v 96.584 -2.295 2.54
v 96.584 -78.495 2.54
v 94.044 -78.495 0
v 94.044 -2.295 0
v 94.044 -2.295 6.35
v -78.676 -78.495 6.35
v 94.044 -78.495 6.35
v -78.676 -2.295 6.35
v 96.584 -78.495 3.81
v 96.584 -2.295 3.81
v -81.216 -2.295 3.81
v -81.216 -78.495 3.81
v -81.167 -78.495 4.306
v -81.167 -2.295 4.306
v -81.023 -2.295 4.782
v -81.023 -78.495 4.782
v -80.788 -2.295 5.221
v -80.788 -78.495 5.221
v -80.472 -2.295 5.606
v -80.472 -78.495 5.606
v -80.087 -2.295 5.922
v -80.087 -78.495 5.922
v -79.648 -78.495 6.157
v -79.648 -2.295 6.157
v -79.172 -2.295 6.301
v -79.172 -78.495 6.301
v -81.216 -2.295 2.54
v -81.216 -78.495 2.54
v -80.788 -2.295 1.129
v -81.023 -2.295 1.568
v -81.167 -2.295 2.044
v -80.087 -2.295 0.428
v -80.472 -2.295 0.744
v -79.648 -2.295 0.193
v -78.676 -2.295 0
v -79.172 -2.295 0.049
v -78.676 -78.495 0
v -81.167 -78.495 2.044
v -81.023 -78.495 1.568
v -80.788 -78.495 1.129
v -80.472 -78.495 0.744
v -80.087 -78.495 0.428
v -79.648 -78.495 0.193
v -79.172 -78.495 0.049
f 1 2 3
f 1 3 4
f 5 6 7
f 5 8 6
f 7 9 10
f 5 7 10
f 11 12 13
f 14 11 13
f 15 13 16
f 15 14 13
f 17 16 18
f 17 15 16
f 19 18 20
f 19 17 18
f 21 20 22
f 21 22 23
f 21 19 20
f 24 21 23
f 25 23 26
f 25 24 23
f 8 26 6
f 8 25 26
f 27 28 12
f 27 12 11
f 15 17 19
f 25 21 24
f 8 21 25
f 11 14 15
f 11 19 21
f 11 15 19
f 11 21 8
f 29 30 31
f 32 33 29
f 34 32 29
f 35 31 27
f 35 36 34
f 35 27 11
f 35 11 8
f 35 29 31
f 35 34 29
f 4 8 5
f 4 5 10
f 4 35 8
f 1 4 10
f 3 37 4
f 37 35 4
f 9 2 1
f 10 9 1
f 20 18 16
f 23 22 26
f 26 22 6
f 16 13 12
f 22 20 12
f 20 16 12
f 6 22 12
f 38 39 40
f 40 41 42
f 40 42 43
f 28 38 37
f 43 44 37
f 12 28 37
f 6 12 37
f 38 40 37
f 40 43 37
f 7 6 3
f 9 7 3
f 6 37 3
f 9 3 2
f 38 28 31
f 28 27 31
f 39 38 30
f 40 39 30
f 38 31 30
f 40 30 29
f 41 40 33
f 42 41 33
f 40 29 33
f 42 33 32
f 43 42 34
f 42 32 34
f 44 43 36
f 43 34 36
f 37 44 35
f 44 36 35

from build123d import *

# Parameters (mm, degrees)
F0_W     = 177.8
F0_H     = 76.2
F1_DEPTH = 6.35
F2_R     = 2.54
F3_SIZE  = 2.54


with BuildPart() as f1:
    # F0 (on Top) → F1 (new body)
    with BuildSketch(Plane.XY):
        with Locations((7.683784, -40.394748)):
            Rectangle(F0_W, F0_H)
    extrude(amount=F1_DEPTH)

    # F2
    f2_edges = [f1.edges().sort_by_distance(p)[0] for p in [
        (-81.216216, -40.394748, 0),
        (-81.216216, -40.394748, 6.35),
    ]]
    fillet(f2_edges, radius=F2_R)

    # F3
    f3_edges = [f1.edges().sort_by_distance(p)[0] for p in [
        (96.583784, -40.394748, 6.35),
        (96.583784, -40.394748, 0),
    ]]
    chamfer(f3_edges, length=F3_SIZE)


solid = f1.part
